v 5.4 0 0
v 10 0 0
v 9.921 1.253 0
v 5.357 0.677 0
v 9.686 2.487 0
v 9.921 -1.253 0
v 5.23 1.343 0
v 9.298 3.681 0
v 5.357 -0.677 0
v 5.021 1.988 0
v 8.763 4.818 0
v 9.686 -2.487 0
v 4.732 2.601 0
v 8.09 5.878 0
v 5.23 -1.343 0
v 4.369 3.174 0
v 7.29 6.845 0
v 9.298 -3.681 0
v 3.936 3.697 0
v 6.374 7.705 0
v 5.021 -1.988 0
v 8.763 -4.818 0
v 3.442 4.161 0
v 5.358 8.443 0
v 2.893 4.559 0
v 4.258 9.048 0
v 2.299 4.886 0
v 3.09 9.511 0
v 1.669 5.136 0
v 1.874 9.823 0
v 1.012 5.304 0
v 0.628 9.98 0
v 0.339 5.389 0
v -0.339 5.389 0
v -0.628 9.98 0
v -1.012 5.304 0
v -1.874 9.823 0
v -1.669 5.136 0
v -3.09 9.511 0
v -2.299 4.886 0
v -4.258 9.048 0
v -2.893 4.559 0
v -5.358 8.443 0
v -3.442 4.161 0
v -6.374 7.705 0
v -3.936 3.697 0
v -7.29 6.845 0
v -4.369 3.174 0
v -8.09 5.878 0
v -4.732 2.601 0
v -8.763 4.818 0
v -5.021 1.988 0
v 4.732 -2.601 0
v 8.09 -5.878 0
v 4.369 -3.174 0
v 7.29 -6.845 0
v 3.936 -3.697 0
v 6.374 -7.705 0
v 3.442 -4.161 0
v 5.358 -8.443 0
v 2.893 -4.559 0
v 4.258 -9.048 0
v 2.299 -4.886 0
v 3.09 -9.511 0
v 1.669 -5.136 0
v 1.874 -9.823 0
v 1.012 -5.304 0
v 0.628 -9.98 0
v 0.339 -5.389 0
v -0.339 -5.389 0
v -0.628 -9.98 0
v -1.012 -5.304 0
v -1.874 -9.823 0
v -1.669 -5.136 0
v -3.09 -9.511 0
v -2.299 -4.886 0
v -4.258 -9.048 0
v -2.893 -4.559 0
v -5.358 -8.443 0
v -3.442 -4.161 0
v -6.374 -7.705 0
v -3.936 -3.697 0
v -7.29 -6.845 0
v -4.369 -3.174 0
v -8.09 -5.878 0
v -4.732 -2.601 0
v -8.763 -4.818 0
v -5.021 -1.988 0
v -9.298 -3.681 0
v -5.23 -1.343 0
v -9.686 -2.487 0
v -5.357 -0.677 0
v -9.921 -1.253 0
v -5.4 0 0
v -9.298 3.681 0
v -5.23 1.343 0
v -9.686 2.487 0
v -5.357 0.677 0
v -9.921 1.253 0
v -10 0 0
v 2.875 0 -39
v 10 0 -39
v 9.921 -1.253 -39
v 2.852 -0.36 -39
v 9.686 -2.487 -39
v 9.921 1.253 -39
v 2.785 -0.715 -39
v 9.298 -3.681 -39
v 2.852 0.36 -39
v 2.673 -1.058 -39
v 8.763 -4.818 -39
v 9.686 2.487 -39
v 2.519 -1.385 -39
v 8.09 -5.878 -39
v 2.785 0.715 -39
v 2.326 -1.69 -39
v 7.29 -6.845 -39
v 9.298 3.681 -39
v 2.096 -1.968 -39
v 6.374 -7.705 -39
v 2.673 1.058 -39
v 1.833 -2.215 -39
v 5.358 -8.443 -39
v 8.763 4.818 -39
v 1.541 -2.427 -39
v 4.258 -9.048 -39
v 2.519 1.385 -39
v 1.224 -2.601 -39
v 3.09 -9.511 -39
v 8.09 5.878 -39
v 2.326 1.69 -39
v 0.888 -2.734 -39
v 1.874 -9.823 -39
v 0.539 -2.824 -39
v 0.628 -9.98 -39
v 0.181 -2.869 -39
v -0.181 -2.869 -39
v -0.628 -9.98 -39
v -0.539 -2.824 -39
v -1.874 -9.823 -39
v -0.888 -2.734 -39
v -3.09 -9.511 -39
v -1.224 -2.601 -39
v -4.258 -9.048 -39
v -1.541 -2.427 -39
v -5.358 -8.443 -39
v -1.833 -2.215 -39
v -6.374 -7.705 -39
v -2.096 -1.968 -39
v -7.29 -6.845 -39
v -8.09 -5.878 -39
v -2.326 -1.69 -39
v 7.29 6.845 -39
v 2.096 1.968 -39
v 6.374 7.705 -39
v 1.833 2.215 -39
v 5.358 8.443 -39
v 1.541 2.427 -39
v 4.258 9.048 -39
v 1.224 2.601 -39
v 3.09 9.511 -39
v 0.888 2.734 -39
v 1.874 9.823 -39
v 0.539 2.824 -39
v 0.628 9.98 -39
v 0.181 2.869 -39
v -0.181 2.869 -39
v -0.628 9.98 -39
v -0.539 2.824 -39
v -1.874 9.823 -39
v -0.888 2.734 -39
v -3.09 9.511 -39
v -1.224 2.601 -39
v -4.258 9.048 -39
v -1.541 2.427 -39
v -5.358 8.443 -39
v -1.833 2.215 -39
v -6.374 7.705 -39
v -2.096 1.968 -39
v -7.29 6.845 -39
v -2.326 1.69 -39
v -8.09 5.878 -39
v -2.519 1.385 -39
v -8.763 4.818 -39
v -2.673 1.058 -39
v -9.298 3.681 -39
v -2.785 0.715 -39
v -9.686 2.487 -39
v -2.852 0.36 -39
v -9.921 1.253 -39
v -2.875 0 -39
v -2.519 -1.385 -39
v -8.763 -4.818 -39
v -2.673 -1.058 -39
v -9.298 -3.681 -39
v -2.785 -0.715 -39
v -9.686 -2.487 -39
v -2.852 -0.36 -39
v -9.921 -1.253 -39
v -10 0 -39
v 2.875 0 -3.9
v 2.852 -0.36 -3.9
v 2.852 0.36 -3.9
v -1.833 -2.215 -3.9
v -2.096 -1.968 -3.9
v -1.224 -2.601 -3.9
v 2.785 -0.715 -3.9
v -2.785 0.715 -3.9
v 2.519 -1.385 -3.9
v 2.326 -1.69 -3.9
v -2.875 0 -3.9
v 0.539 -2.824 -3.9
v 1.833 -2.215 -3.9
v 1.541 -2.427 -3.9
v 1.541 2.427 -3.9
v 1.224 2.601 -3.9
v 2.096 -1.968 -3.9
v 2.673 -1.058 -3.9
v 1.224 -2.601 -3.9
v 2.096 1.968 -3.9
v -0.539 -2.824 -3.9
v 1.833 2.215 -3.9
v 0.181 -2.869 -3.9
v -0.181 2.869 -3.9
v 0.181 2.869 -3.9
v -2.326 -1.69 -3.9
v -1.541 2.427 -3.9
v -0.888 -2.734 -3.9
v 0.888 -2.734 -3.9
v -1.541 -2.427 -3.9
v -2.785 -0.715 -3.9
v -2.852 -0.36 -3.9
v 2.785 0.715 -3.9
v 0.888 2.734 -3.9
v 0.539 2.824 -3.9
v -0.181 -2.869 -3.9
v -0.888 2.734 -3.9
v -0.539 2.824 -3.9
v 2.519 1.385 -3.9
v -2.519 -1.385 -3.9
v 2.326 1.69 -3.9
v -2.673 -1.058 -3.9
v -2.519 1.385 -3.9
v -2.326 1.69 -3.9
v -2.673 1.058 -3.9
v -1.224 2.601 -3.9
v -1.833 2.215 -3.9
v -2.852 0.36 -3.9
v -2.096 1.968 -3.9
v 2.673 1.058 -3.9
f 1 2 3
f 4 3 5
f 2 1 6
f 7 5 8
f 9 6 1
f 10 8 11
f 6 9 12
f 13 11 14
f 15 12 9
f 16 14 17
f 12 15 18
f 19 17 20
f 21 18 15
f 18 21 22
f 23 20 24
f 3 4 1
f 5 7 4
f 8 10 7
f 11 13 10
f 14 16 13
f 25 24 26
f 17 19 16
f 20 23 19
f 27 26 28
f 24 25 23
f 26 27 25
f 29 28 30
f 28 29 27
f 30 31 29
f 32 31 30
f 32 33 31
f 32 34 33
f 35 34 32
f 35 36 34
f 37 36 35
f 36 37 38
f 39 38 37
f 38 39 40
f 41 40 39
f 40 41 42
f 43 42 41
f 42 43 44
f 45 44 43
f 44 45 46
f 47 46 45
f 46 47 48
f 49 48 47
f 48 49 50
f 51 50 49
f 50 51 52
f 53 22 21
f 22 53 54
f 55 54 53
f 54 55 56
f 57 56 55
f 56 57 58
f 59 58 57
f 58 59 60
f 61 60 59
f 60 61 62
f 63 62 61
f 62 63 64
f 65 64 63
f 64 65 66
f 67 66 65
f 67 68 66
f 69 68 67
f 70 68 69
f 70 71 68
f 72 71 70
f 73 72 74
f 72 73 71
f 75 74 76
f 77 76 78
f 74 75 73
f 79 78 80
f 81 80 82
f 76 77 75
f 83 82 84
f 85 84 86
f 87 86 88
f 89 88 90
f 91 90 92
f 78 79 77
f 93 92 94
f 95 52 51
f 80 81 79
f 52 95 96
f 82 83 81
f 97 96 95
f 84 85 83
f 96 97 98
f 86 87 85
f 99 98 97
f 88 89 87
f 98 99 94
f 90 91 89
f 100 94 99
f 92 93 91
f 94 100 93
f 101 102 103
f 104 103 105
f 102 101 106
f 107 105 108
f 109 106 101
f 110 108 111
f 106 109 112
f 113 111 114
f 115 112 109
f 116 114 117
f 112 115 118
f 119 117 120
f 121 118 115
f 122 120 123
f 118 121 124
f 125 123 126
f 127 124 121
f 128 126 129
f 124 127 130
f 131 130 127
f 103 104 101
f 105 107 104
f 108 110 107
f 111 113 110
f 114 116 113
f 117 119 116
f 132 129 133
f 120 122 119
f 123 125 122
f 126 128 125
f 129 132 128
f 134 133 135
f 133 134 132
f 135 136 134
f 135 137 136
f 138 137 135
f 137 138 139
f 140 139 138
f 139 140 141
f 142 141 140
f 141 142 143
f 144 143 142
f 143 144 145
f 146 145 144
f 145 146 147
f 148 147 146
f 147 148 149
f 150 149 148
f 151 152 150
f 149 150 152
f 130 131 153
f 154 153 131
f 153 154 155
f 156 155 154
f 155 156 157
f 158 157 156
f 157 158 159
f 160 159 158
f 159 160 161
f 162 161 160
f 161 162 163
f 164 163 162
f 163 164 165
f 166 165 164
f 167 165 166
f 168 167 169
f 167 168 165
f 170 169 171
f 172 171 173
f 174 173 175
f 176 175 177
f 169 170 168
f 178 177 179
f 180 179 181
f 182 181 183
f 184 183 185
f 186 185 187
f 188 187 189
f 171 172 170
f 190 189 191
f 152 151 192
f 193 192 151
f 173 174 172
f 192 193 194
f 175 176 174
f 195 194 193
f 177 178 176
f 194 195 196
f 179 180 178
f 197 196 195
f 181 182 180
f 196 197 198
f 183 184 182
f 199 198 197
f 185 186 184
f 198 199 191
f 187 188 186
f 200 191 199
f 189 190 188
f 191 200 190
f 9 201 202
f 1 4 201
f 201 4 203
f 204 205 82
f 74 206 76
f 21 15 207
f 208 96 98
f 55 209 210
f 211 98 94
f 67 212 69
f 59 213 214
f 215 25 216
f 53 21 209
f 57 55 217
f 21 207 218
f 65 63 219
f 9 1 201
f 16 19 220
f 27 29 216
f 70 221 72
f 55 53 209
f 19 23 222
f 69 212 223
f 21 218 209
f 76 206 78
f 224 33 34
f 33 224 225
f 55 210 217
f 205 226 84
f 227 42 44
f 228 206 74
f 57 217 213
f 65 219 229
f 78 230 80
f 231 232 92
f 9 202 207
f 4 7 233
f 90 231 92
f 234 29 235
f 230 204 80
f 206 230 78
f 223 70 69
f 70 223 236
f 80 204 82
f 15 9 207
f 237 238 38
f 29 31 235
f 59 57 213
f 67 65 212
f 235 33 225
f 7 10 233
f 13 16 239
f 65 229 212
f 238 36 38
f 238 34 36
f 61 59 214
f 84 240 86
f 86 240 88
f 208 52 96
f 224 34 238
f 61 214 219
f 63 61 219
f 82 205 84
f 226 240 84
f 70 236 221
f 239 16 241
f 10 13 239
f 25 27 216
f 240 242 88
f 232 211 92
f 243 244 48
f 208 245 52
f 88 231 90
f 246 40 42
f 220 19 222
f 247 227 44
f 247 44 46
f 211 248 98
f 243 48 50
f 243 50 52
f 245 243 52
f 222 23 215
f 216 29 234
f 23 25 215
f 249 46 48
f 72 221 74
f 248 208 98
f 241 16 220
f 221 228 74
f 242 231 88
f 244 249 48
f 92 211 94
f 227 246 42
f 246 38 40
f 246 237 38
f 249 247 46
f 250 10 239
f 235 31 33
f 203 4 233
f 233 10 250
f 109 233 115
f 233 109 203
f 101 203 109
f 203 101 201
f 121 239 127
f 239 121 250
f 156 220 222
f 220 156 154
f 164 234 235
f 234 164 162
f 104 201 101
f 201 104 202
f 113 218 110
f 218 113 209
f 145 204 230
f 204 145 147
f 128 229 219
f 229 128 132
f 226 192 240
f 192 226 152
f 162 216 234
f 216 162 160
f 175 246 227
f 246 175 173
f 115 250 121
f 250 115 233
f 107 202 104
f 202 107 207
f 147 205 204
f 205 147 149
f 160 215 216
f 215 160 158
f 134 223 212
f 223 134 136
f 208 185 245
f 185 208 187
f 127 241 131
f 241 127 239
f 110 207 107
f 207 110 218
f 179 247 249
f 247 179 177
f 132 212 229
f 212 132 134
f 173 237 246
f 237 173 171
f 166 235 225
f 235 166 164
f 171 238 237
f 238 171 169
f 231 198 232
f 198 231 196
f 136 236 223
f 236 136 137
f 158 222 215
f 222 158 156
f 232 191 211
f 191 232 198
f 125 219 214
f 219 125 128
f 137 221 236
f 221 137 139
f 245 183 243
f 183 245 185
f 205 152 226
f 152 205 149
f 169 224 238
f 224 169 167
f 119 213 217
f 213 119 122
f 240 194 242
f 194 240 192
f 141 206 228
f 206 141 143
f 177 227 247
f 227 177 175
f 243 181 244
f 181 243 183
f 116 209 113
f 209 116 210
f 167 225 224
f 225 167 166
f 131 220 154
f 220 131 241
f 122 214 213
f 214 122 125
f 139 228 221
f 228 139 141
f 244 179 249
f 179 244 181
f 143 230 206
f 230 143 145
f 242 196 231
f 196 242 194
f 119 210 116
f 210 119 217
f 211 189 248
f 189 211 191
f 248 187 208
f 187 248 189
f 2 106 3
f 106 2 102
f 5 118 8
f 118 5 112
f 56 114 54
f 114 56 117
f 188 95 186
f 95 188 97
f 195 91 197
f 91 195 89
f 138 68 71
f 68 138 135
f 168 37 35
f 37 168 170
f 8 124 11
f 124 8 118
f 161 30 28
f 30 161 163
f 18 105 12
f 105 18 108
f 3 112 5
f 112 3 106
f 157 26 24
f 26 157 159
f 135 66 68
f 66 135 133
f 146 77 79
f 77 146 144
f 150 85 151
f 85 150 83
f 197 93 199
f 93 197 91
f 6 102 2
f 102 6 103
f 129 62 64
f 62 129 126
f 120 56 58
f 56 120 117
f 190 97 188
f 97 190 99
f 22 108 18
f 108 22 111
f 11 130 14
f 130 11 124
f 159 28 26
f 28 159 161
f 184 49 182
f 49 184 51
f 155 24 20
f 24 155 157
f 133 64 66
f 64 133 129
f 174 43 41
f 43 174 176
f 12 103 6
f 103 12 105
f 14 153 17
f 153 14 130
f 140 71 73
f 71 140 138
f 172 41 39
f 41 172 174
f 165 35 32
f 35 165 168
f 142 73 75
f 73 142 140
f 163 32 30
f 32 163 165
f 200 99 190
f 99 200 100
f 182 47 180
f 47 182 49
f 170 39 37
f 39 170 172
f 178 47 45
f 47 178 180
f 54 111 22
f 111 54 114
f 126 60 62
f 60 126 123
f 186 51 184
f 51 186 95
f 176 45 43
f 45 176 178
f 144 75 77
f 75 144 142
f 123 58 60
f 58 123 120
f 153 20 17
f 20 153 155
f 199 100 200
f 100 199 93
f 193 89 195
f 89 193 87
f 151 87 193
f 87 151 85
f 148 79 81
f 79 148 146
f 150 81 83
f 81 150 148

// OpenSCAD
$fn = 50;


difference() {
	union() {
		translate(v = [0, 0, -39.0000000000]) {
			cylinder(h = 39, r = 10.0000000000);
		}
	}
	union() {
		translate(v = [0, 0, 0]) {
			rotate(a = [0, 0, 0]) {
				difference() {
					union() {
						#translate(v = [0, 0, -39.0000000000]) {
							cylinder(h = 39, r = 2.6000000000);
						}
						#translate(v = [0, 0, -3.9000000000]) {
							cylinder(h = 3.9000000000, r1 = 2.8750000000, r2 = 5.4000000000);
						}
						#translate(v = [0, 0, -39.0000000000]) {
							cylinder(h = 39, r = 2.8750000000);
						}
						#translate(v = [0, 0, -39.0000000000]) {
							cylinder(h = 39, r = 2.6000000000);
						}
					}
					union();
				}
			}
		}
	}
}
